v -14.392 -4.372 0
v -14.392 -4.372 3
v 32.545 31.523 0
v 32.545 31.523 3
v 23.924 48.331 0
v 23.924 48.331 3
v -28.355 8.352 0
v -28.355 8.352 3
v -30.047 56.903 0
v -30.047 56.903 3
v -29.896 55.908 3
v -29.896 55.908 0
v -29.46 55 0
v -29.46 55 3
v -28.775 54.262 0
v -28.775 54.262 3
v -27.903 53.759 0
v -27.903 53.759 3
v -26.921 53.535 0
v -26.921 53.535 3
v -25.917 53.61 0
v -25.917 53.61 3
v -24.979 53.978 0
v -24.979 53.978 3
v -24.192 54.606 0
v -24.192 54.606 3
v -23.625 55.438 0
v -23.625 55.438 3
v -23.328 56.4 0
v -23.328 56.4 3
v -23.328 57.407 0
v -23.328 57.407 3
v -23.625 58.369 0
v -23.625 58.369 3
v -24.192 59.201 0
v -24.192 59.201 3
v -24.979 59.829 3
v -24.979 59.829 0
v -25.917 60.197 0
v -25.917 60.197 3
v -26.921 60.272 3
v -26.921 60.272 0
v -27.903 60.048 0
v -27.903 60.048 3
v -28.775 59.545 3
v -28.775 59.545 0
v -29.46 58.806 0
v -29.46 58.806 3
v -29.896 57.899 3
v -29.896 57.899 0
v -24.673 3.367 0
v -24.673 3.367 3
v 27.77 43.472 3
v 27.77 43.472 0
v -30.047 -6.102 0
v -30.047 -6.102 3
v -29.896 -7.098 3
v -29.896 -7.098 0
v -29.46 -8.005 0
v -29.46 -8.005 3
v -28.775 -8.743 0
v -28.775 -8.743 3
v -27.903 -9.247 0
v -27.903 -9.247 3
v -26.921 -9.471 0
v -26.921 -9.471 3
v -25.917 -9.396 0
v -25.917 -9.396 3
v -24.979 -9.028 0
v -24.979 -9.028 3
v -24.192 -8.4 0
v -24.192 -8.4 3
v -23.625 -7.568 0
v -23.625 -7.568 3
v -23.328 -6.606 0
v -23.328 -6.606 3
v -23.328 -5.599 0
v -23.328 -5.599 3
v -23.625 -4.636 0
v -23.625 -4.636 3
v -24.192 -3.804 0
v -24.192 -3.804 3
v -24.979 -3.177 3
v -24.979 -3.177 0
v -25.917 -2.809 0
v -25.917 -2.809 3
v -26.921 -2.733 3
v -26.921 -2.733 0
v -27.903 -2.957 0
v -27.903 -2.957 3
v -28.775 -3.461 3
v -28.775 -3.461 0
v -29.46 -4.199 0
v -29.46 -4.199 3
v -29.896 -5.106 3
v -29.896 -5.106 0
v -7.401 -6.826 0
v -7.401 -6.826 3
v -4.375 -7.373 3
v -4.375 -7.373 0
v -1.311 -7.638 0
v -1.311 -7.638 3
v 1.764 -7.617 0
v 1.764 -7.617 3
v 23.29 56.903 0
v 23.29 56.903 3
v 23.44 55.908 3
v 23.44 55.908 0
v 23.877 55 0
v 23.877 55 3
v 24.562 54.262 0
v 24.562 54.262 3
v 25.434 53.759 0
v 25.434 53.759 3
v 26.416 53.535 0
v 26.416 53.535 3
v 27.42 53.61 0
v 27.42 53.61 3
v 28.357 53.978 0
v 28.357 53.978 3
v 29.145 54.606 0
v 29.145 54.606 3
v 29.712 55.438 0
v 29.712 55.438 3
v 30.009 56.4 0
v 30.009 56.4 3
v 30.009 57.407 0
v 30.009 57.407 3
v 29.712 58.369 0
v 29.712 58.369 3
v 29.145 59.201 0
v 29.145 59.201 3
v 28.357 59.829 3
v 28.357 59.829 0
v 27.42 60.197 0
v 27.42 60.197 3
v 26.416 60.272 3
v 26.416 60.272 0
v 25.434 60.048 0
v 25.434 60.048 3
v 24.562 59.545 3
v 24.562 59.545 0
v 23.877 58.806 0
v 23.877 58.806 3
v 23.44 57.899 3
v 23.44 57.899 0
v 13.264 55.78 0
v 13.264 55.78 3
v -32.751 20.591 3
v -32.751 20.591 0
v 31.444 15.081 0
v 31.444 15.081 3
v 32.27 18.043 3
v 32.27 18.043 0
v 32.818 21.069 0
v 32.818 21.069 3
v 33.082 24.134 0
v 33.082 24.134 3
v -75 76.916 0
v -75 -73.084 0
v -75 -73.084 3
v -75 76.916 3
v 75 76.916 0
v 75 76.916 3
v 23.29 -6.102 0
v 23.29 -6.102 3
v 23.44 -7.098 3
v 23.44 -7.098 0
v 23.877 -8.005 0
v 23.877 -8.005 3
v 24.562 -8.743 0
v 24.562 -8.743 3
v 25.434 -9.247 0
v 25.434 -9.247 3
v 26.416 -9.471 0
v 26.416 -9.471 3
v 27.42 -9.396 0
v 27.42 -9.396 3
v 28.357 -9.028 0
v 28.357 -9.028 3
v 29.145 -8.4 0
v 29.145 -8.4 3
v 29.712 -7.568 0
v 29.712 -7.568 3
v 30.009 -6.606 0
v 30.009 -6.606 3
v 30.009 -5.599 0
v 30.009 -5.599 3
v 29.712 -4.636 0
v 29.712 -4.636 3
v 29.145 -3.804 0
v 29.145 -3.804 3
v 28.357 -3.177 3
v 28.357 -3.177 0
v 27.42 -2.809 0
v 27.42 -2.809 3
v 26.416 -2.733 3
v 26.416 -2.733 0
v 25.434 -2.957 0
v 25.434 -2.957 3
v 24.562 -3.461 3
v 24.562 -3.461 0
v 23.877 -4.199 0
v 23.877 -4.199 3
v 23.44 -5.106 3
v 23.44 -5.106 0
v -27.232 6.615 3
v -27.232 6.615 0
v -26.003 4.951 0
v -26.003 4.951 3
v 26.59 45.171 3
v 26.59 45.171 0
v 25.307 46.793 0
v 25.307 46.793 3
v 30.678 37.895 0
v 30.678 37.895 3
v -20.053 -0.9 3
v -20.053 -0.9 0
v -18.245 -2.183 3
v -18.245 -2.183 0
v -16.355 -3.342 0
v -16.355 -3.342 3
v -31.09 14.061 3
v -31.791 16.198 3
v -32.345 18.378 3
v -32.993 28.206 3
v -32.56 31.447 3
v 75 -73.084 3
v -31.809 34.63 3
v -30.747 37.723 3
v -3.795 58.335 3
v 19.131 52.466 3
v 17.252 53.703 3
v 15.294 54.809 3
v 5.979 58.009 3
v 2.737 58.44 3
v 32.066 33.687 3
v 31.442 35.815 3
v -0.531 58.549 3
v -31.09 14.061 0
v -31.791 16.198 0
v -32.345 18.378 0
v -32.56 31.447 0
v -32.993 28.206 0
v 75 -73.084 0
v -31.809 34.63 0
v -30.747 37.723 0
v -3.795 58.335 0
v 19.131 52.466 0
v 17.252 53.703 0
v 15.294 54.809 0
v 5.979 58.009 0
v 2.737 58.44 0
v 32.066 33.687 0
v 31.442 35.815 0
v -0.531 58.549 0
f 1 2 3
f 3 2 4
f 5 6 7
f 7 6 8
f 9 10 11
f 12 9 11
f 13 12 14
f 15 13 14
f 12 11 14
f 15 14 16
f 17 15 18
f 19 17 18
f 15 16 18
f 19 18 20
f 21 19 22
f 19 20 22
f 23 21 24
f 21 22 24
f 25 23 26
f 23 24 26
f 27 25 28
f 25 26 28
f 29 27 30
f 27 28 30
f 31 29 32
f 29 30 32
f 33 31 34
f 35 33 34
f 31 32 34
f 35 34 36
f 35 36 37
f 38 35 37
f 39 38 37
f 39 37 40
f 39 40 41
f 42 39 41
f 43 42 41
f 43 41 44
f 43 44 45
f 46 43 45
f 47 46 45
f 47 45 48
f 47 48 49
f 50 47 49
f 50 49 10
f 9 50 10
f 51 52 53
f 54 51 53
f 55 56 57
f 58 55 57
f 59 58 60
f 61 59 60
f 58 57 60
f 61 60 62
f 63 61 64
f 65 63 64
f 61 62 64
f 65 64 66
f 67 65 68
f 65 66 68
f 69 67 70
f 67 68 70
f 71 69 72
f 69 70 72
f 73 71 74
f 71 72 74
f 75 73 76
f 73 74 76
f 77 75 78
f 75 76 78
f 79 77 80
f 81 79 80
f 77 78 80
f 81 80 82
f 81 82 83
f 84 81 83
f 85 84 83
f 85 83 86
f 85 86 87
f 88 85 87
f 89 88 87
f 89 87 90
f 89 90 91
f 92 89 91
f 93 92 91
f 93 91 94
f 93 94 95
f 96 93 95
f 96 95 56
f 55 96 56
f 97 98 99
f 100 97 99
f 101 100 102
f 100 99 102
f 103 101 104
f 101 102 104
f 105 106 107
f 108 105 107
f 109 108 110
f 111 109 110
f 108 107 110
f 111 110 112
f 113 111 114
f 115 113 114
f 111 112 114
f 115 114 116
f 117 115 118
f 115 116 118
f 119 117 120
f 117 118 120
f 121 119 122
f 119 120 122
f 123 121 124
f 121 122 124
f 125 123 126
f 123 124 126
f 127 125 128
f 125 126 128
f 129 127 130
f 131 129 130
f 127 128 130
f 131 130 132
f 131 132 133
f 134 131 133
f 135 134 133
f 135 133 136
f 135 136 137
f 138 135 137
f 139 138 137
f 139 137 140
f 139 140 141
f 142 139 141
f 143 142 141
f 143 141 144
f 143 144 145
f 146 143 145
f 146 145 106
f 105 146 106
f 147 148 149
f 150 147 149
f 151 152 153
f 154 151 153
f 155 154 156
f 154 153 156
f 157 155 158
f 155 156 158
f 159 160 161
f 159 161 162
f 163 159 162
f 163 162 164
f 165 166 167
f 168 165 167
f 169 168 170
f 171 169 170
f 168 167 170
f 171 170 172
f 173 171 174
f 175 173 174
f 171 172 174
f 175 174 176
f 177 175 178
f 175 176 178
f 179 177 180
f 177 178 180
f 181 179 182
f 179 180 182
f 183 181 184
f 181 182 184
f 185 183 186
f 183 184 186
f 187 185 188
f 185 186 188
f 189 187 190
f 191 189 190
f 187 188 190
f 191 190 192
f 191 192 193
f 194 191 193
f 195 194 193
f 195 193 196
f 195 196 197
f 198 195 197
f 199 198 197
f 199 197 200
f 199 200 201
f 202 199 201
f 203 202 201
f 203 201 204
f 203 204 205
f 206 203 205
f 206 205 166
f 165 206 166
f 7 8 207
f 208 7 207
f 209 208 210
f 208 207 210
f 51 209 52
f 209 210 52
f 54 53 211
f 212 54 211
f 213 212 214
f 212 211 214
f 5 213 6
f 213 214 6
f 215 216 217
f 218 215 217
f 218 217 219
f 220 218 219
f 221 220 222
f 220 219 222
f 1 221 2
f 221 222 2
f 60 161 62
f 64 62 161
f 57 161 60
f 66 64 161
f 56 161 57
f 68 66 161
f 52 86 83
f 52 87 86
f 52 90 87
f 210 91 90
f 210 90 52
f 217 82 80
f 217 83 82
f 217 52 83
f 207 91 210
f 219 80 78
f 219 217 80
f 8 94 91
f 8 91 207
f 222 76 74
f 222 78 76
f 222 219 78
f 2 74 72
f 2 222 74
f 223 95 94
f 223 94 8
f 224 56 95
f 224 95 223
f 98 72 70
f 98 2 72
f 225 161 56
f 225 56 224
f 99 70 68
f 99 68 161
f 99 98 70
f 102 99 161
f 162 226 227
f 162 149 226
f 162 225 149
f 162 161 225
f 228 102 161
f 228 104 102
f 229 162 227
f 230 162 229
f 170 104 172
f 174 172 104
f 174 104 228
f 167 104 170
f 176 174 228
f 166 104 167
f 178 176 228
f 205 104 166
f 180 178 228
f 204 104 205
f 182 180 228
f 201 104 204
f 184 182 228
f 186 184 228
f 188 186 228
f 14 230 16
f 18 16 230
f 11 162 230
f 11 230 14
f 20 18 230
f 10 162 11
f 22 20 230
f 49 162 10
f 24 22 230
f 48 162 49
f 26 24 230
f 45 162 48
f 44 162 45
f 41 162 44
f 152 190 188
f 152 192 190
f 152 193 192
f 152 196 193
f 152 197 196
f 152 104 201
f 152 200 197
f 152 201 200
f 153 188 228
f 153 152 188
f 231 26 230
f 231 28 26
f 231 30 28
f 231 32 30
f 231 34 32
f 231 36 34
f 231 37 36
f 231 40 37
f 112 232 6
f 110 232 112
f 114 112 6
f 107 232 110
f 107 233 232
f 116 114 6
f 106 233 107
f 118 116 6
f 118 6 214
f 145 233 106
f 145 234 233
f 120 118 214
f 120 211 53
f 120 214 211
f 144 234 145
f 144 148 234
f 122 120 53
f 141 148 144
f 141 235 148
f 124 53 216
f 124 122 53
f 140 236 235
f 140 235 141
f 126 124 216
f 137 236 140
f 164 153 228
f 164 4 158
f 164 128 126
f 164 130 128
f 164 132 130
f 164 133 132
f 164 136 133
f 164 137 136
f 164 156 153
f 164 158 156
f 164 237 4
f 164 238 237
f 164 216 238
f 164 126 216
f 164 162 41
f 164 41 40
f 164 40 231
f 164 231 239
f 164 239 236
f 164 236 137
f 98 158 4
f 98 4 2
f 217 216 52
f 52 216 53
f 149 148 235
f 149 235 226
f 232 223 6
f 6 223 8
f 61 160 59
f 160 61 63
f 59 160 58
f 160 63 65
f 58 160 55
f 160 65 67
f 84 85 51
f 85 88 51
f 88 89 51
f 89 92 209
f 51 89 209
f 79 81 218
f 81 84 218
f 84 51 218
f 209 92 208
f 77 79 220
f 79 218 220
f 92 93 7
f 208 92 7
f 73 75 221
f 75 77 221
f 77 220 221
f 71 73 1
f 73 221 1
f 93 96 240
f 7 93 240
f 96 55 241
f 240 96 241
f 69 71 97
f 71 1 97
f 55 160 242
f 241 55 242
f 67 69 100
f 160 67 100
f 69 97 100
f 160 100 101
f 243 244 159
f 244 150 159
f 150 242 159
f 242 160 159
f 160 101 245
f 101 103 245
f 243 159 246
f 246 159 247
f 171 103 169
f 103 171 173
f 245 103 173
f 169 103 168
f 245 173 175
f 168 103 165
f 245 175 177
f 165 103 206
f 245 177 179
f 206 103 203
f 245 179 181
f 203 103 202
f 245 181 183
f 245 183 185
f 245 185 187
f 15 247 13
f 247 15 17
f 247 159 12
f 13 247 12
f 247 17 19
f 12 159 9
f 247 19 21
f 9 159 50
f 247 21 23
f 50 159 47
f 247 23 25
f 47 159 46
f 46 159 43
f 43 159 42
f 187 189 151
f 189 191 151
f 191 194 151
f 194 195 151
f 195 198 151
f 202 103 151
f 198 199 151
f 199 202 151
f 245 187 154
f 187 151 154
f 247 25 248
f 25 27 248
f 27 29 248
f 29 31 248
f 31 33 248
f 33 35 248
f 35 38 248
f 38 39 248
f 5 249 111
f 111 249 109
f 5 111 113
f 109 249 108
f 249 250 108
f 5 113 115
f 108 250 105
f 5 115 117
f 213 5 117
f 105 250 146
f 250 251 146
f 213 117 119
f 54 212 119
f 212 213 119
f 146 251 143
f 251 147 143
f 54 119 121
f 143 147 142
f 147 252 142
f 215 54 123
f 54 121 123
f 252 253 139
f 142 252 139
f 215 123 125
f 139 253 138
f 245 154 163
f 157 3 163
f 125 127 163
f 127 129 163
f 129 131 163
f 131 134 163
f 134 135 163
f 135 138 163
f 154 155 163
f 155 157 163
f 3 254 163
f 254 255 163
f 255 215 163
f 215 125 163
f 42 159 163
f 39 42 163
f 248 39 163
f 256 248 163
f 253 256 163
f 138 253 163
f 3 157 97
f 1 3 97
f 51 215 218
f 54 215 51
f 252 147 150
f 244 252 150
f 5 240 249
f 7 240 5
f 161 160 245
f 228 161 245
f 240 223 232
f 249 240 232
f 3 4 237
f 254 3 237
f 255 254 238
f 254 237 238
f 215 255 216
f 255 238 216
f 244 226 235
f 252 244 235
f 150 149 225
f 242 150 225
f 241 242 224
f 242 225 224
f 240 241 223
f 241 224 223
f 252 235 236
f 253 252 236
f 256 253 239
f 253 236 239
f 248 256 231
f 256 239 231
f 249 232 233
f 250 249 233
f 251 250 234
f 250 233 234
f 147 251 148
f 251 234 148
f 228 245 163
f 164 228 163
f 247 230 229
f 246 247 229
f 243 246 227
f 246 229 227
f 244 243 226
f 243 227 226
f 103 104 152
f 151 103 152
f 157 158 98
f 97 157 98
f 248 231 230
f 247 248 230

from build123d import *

# Parameters (mm, degrees)
F0_W     = 150
F0_H     = 150
F1_DEPTH = 3
F2_D     = 6.7564
F4_DEPTH = 25


with BuildPart() as f1:
    # F0 (on Top) → F1 (new body)
    with BuildSketch(Plane.XY):
        with Locations((0, 1.9158130744)):
            Rectangle(F0_W, F0_H)
    extrude(amount=F1_DEPTH)

    # F2 (through all)
    with Locations(Plane(origin=(0, 0, 0), x_dir=(1, 0, 0), z_dir=(0, 0, -1))):
        with Locations((-26.6683554199, -56.9034204527), (26.6683554199, -56.9034204527), (-26.6683554199, 6.102117215), (26.6683554199, 6.102117215)):
            Hole(F2_D / 2)

    # F3 (on face) → F4 (cut)
    with BuildSketch(Plane.XY.offset(3)):
        with BuildLine():
            Line((-3.7946185299, 58.3347232517), (-30.747280214, 37.7231456992))
            ThreePointArc((-30.747280214, 37.7231456992), (-32.2234435202, 33.0477107055), (-32.9929459562, 28.2055400674))
            Line((-32.9929459562, 28.2055400674), (5.9788893458, 58.0085708442))
            ThreePointArc((5.9788893458, 58.0085708442), (1.1042434503, 58.5344775669), (-3.7946185299, 58.3347232517))
        make_face()
        with BuildLine():
            Line((13.2642979666, 55.7796879625), (-32.7505124435, 20.5906649099))
            ThreePointArc((-32.7505124435, 20.5906649099), (-32.0865867054, 17.2832595371), (-31.0895548602, 14.0605812744))
            Line((-31.0895548602, 14.0605812744), (19.1311825167, 52.4660135586))
            ThreePointArc((19.1311825167, 52.4660135586), (16.2822571669, 54.2724885893), (13.2642979666, 55.7796879625))
        make_face()
        with BuildLine():
            Line((23.9241830701, 48.3311051134), (-28.3547132801, 8.3517316803))
            ThreePointArc((-28.3547132801, 8.3517316803), (-26.6305999484, 5.7731261787), (-24.6727303472, 3.3671919031))
            Line((-24.6727303472, 3.3671919031), (27.7700422707, 43.4718868513))
            ThreePointArc((27.7700422707, 43.4718868513), (25.96105225, 45.9916741873), (23.9241830701, 48.3311051134))
        make_face()
        with BuildLine():
            Line((30.6779404767, 37.8953792911), (-20.0527864197, -0.900058576))
            ThreePointArc((-20.0527864197, -0.900058576), (-17.3098813008, -2.7781418823), (-14.3924694915, -4.371701963))
            Line((-14.3924694915, -4.371701963), (32.545465682, 31.5232646388))
            ThreePointArc((32.545465682, 31.5232646388), (31.7718544133, 34.7562587621), (30.6779404767, 37.8953792911))
        make_face()
        with BuildLine():
            Line((33.0822923496, 24.1335215078), (-7.4014540257, -6.8257168713))
            ThreePointArc((-7.4014540257, -6.8257168713), (-2.8461445024, -7.5410678745), (1.7643727579, -7.6165827867))
            Line((1.7643727579, -7.6165827867), (31.4443076996, 15.0806293838))
            ThreePointArc((31.4443076996, 15.0806293838), (32.5792762723, 19.5499042969), (33.0822923496, 24.1335215078))
        make_face()
    extrude(amount=-F4_DEPTH, mode=Mode.SUBTRACT)


solid = f1.part
